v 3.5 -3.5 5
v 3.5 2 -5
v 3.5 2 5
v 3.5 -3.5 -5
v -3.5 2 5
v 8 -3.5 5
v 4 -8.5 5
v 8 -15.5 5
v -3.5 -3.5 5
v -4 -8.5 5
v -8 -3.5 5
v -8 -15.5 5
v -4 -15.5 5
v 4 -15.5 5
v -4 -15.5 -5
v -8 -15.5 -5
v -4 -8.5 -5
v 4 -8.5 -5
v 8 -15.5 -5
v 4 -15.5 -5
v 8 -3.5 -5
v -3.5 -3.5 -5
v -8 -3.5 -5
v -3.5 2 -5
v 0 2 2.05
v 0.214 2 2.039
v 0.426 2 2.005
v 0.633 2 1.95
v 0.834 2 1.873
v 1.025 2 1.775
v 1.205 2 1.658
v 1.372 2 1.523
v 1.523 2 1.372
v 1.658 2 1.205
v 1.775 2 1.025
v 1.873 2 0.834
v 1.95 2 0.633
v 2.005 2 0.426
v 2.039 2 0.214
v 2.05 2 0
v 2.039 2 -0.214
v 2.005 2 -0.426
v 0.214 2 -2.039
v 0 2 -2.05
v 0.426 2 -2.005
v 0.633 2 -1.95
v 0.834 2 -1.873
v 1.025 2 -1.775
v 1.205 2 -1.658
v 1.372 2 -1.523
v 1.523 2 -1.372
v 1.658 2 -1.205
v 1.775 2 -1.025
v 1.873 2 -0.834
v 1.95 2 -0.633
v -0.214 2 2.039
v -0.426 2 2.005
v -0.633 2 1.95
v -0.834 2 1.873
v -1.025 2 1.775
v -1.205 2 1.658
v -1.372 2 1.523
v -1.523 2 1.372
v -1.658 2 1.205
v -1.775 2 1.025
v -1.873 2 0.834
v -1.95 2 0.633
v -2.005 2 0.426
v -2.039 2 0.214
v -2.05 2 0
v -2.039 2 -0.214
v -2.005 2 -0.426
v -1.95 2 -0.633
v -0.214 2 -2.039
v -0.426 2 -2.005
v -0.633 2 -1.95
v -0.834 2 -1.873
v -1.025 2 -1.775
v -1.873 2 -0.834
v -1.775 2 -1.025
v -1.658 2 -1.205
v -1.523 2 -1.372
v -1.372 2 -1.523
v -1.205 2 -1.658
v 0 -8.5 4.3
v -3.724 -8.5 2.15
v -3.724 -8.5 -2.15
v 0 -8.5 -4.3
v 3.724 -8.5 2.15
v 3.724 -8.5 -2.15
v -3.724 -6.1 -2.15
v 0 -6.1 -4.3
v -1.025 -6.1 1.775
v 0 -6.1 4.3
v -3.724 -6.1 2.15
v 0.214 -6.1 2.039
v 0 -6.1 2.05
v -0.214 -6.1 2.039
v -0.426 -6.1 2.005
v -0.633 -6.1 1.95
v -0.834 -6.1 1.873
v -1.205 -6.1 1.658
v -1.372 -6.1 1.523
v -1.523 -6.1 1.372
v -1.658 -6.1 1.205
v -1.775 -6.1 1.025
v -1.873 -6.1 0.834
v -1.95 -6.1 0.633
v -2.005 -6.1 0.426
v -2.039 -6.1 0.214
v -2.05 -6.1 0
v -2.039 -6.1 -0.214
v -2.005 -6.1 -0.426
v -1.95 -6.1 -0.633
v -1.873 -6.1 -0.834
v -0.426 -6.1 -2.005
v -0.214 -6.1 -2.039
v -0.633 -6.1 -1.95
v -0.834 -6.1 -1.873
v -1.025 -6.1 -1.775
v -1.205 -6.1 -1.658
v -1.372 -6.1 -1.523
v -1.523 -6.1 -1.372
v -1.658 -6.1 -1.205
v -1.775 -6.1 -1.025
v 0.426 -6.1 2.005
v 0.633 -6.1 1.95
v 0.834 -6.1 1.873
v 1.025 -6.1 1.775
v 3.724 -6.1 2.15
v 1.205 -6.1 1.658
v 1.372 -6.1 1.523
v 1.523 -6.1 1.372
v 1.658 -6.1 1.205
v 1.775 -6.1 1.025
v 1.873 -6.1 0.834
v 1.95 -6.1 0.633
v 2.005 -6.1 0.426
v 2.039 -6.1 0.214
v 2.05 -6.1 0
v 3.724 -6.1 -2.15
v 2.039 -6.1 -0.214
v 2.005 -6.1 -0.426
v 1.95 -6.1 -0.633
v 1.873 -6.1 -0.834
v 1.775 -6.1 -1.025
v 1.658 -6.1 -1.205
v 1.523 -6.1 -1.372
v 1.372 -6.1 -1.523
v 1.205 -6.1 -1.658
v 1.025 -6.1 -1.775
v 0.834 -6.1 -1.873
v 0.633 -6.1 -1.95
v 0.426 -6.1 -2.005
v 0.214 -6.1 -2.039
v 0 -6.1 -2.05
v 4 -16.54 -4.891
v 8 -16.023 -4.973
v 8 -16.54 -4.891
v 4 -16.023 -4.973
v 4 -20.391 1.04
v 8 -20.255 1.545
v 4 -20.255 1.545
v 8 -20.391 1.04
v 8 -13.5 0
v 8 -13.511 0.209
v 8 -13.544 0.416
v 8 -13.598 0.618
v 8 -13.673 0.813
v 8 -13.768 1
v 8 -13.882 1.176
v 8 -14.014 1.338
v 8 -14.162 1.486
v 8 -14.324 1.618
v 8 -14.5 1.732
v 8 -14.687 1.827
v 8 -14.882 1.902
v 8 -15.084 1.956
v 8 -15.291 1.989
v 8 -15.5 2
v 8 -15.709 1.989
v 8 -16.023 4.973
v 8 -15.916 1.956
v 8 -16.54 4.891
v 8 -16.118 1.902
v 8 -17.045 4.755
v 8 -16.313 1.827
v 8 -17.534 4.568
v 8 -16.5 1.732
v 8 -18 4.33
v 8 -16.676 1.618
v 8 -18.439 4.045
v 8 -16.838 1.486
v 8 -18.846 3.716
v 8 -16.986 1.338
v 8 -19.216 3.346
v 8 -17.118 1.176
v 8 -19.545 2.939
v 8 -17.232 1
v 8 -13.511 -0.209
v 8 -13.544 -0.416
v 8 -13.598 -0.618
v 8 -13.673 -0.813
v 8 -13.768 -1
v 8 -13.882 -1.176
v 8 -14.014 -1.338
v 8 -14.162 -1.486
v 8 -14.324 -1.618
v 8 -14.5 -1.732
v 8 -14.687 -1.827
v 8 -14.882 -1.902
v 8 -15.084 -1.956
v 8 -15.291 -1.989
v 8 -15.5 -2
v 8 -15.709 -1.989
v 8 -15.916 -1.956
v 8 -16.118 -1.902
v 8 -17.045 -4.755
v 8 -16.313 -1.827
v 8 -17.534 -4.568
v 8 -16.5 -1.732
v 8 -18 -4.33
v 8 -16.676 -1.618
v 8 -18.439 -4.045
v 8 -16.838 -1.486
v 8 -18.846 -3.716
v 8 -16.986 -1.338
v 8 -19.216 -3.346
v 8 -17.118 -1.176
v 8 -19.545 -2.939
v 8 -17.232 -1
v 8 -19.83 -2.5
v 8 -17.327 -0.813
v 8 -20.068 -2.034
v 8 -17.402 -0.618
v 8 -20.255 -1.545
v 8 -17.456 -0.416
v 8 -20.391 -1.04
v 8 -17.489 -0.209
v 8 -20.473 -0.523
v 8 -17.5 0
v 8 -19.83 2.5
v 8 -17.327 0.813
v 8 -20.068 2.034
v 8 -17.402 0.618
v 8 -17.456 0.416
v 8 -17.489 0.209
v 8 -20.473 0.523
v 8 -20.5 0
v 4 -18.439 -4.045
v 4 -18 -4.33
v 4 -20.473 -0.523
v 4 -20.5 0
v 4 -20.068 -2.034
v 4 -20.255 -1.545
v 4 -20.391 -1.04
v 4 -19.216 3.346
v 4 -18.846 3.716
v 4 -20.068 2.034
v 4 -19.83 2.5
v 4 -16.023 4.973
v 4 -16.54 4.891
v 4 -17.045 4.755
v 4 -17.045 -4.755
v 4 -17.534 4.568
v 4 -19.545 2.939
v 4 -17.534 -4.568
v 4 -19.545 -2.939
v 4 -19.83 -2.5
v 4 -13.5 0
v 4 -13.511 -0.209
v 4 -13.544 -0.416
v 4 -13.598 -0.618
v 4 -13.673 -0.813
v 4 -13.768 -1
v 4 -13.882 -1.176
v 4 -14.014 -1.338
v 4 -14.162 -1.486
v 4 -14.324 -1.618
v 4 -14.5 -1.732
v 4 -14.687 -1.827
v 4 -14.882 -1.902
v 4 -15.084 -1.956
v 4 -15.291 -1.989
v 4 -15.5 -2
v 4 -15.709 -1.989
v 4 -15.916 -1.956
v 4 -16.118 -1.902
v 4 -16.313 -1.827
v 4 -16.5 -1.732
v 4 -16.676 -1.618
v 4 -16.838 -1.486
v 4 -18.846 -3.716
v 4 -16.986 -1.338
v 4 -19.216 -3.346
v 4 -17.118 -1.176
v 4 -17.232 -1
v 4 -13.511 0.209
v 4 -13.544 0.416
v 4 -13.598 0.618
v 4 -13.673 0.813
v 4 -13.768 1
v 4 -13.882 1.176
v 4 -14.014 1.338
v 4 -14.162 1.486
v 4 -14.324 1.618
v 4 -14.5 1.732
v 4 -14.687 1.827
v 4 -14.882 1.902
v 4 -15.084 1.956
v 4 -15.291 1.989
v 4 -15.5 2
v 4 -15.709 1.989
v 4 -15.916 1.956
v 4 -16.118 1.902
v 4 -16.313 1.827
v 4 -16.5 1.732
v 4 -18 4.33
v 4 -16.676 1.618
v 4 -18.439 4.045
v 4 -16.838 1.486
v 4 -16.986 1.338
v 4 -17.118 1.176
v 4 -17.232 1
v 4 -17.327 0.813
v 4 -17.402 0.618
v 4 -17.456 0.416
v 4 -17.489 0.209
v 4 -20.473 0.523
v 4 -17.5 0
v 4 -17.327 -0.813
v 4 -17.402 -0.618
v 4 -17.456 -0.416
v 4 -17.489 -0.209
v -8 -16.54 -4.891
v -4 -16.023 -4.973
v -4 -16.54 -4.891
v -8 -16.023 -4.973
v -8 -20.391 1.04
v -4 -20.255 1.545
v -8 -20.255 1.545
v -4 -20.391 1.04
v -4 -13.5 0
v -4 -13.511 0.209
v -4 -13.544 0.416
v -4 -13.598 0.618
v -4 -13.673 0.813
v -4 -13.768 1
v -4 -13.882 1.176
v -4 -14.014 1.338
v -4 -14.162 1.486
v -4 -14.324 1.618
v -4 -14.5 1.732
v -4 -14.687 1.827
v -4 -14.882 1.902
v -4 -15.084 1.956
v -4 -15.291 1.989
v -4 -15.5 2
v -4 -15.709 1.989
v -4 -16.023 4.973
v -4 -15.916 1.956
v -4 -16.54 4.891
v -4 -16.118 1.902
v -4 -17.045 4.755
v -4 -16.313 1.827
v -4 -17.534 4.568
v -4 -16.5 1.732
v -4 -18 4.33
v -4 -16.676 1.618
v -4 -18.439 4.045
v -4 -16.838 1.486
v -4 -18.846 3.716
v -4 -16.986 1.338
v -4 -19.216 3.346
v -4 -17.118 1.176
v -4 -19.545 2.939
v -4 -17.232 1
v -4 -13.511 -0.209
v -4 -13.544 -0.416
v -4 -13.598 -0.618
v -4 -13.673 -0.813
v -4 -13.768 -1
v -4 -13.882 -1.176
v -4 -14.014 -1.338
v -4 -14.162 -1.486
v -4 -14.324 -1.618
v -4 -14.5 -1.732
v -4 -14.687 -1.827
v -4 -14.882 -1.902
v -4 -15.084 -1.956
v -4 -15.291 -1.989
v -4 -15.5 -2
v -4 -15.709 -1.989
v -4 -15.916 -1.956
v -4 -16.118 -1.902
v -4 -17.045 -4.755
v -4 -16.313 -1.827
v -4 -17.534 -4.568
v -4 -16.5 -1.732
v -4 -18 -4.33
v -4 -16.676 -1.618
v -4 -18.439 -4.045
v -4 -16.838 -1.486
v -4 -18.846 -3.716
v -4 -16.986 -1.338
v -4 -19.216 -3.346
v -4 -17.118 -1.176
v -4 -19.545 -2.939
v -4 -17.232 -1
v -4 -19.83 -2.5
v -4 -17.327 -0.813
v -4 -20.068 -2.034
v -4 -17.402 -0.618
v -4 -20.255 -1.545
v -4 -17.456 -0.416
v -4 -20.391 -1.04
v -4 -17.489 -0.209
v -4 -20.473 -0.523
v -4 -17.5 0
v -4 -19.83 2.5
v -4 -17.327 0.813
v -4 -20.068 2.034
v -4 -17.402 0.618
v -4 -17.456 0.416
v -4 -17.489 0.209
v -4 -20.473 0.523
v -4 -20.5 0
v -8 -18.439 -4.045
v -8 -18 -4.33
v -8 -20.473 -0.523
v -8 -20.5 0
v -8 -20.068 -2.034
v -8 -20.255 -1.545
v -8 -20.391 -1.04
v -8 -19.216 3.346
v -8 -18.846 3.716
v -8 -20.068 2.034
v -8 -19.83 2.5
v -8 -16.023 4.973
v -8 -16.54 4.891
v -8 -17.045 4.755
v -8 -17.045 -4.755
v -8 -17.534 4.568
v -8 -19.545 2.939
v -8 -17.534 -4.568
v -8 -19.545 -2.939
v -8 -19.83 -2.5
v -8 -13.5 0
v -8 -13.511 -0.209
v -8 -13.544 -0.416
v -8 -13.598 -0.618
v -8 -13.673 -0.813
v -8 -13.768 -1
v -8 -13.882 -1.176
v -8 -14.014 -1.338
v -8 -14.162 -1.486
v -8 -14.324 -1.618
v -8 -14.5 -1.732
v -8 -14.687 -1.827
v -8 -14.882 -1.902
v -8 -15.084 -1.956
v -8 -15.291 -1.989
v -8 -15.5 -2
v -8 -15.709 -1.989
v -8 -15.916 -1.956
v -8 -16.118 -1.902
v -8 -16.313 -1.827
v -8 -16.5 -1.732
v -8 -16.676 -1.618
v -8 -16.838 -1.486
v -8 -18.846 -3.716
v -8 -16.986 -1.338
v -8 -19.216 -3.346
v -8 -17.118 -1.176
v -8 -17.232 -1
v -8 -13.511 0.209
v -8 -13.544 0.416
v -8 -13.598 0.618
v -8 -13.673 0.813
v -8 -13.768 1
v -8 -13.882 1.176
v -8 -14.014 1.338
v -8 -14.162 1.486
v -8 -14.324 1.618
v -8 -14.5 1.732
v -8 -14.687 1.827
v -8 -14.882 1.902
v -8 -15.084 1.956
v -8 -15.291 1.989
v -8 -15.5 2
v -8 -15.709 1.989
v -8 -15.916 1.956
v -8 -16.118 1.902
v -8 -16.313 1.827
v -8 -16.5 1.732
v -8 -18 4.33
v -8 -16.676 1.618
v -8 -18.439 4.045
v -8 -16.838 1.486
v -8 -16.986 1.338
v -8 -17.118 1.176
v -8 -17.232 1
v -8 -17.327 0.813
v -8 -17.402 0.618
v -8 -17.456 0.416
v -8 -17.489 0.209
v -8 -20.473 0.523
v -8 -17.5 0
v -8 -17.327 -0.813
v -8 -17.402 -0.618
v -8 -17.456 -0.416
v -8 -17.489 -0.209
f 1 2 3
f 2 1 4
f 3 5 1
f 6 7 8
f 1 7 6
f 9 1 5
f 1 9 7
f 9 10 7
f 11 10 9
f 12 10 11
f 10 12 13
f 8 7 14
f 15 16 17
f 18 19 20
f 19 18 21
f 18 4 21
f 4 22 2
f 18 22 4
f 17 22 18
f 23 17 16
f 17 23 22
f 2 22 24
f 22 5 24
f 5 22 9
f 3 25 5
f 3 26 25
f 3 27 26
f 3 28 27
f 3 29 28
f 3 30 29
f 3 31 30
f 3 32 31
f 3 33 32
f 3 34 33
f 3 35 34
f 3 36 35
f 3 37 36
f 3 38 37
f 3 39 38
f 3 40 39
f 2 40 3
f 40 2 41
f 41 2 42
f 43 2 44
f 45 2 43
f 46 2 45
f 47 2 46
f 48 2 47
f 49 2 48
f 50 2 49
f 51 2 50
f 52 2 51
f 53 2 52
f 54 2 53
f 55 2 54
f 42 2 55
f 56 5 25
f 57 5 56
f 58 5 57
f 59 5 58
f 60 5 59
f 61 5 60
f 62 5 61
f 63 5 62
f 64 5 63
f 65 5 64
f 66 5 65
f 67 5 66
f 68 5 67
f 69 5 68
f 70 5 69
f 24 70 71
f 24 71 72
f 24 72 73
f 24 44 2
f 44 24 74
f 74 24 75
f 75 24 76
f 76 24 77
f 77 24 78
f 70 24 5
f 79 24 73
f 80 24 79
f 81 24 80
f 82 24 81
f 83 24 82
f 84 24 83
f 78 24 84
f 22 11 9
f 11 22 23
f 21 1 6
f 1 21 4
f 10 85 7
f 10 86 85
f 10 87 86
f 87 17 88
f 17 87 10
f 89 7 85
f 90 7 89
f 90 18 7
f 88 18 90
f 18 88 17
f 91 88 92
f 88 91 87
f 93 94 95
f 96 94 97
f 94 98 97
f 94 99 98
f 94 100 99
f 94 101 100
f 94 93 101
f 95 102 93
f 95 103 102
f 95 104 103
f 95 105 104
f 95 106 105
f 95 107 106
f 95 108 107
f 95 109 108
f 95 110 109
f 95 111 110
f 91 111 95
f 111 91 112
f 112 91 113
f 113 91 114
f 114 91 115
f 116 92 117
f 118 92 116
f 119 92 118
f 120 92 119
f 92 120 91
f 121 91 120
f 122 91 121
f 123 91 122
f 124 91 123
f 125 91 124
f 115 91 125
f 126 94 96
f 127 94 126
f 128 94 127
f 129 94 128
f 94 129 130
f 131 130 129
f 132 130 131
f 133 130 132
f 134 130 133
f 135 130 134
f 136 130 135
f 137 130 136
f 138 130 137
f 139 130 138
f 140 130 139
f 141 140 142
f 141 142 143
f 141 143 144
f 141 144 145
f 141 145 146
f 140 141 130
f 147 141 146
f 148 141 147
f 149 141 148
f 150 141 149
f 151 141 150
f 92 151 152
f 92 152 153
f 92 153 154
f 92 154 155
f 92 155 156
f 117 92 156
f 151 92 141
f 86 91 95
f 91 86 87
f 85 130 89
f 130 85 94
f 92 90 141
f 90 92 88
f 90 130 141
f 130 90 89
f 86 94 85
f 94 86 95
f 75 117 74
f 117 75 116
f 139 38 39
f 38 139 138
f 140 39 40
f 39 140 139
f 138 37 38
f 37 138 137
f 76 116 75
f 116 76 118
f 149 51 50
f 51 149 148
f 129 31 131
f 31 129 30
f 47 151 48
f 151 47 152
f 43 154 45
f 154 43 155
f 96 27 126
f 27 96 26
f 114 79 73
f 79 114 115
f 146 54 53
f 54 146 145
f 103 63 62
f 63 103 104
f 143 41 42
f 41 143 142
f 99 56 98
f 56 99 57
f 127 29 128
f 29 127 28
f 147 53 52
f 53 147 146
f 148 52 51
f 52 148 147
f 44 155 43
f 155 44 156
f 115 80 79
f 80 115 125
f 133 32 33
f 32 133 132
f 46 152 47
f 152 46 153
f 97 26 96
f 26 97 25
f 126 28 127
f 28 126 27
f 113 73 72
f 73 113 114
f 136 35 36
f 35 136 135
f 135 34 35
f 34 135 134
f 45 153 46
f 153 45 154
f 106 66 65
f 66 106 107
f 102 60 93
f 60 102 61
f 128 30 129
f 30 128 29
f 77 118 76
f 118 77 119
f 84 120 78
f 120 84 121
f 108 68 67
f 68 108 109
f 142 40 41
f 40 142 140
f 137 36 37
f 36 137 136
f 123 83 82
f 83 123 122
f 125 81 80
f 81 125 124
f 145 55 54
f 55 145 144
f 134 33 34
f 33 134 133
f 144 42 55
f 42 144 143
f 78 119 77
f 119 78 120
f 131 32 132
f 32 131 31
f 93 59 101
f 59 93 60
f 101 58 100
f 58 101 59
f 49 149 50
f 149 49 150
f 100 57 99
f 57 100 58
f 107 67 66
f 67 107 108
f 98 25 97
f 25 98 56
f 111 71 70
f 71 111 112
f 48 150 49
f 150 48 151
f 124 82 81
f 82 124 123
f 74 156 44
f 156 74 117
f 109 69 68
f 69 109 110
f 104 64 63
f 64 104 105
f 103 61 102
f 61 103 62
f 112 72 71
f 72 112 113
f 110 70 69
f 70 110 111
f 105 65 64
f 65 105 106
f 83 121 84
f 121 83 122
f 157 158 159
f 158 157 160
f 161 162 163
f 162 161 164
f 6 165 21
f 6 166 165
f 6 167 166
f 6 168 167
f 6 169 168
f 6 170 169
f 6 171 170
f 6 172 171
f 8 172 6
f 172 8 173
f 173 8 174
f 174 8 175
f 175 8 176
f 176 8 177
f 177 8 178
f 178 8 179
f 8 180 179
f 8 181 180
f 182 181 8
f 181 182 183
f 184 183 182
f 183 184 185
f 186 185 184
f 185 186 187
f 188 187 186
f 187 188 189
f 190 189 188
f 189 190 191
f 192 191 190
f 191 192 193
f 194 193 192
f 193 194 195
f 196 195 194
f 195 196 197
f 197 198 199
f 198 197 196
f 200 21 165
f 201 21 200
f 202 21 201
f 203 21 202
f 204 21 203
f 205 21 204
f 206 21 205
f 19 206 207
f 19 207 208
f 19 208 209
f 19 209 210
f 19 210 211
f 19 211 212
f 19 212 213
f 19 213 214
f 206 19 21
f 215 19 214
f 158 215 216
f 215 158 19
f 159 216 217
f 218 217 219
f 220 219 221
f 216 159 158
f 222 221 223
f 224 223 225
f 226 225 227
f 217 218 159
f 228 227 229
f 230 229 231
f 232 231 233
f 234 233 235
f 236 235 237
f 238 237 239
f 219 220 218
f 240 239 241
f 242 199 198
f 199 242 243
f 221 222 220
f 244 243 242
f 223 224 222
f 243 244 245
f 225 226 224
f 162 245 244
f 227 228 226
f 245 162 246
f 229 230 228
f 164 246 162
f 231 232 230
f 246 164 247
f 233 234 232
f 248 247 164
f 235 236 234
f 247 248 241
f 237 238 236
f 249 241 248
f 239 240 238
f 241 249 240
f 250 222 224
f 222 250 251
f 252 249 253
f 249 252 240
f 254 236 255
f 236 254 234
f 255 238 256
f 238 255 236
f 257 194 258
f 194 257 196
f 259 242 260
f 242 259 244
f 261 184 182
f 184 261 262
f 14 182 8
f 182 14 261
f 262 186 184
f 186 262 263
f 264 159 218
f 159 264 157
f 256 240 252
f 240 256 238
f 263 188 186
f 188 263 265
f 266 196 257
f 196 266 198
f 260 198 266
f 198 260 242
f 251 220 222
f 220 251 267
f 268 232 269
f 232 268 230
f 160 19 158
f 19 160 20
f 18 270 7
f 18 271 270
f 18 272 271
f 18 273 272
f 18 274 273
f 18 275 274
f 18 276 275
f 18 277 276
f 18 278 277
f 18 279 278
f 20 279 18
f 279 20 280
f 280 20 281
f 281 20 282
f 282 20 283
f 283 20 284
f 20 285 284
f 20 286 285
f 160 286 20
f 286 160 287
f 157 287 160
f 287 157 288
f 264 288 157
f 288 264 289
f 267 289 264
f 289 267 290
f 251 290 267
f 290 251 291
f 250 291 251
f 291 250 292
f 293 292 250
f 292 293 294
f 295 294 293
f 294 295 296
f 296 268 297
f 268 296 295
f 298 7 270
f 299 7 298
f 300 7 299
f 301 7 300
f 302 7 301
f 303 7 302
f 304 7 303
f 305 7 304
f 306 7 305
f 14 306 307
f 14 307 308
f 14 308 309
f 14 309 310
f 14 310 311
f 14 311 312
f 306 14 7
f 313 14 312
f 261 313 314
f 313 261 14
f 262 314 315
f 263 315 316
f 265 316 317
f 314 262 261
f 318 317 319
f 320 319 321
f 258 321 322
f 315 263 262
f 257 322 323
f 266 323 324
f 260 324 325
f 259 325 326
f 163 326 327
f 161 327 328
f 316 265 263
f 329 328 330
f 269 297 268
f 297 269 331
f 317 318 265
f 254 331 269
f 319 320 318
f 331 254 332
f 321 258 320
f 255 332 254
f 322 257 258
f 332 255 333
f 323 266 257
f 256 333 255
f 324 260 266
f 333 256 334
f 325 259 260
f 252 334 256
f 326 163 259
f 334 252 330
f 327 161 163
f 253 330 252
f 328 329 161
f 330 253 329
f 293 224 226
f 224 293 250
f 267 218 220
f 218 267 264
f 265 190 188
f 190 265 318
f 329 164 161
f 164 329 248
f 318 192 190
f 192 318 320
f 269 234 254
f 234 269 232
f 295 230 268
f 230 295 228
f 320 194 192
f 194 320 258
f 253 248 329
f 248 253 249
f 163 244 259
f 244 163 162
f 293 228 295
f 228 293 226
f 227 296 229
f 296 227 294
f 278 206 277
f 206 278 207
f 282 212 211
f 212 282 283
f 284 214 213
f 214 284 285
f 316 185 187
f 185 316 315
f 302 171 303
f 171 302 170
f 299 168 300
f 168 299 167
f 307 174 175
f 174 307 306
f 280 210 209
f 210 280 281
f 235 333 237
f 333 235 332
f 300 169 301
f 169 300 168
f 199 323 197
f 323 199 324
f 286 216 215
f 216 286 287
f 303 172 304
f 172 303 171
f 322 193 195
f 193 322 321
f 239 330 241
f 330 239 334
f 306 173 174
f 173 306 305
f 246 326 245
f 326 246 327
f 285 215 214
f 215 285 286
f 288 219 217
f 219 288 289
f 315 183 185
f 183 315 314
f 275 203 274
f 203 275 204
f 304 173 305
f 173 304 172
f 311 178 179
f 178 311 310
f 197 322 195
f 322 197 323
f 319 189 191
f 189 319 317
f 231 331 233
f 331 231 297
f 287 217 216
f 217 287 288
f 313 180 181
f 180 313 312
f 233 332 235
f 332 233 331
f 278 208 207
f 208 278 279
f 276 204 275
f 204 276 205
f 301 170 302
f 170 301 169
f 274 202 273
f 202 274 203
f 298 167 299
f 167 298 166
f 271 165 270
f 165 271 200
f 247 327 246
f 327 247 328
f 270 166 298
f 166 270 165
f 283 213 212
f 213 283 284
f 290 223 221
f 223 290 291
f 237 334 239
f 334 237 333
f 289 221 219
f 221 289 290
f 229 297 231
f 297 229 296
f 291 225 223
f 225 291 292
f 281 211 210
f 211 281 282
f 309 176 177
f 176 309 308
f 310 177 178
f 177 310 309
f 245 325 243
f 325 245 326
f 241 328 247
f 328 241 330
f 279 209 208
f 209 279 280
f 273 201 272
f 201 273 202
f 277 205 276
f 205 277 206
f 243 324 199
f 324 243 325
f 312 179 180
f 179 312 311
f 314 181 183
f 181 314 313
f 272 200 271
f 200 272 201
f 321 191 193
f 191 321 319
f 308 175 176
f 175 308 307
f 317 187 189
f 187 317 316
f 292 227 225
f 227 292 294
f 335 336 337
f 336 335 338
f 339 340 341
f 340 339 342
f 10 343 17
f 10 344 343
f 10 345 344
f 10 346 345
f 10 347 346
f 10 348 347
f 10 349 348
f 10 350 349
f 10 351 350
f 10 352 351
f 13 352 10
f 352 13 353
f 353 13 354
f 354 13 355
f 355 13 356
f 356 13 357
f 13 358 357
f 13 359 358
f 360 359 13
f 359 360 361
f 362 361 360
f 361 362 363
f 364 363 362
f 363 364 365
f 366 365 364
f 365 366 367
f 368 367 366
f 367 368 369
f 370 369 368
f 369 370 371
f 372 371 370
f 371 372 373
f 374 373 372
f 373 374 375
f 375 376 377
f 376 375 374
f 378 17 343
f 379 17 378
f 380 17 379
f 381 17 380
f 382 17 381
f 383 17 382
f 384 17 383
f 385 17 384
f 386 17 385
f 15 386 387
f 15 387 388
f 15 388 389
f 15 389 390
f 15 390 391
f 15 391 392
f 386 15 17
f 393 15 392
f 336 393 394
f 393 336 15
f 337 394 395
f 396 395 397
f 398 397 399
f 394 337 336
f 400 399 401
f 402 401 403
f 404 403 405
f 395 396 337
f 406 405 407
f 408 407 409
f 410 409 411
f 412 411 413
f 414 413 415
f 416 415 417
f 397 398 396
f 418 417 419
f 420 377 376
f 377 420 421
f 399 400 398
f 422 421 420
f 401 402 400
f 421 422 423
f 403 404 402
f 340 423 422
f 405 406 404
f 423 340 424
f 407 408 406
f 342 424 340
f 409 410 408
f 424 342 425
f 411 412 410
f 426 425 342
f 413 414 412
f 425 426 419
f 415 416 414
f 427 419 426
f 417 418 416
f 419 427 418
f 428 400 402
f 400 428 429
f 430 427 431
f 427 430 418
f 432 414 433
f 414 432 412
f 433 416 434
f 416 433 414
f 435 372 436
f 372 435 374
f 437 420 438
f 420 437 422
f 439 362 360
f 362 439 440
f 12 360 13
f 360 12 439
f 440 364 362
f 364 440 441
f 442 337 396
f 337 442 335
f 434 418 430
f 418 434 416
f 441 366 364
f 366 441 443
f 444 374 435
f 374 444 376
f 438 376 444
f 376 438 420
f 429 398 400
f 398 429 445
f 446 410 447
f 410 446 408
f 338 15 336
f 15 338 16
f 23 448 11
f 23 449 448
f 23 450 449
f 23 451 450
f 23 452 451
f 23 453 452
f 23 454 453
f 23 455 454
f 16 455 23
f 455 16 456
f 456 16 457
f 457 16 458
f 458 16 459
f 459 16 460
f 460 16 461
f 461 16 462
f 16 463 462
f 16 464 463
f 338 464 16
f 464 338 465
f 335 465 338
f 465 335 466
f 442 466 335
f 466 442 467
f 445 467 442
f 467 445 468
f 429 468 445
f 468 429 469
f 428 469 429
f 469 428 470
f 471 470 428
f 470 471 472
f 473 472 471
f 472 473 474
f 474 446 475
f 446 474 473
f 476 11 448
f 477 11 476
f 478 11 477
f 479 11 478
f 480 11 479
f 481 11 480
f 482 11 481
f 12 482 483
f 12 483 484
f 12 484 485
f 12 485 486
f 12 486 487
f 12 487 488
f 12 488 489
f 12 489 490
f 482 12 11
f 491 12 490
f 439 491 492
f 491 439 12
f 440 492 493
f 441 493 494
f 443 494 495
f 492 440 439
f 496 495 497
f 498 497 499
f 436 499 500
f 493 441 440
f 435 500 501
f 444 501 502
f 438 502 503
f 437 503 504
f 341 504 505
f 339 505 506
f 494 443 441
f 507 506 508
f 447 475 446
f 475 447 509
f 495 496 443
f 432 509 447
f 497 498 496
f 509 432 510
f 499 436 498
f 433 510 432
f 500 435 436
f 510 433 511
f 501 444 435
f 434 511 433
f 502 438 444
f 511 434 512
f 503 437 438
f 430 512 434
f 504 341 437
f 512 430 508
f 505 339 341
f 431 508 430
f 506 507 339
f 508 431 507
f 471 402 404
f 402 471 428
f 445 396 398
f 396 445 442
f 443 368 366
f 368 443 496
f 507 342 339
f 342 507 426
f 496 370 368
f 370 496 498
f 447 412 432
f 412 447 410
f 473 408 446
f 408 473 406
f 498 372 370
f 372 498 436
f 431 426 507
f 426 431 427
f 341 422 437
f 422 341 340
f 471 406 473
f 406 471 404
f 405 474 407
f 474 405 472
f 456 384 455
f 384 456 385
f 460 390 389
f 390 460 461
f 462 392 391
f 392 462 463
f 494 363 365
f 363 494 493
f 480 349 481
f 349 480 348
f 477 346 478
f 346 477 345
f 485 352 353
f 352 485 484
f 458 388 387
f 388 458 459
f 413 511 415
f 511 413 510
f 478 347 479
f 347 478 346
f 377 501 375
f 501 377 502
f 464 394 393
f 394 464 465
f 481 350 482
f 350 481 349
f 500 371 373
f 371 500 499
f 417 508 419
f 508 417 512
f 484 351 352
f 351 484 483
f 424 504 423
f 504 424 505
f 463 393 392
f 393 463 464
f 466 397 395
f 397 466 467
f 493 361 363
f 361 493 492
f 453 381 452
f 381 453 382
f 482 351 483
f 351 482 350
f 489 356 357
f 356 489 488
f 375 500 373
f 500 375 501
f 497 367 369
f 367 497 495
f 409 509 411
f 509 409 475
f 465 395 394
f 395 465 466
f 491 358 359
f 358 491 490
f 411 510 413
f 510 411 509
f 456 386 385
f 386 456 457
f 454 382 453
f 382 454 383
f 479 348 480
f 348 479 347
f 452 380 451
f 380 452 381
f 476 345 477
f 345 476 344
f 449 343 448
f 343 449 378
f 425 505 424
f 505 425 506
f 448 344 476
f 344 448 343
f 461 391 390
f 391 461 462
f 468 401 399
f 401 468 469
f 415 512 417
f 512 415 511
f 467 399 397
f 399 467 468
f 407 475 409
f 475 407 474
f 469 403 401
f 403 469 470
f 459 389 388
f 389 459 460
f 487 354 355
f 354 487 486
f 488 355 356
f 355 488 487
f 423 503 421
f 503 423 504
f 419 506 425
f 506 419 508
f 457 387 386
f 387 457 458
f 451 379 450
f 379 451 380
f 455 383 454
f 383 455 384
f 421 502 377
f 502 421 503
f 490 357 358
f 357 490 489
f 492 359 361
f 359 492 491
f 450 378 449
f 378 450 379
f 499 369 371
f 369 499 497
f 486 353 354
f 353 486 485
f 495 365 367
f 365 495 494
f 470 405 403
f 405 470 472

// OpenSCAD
// file: Fan_60x25.scad
$fn=60;  //Working
//$fn=720;  //Show off
//=======================================================================================  
module fan_60mm_x_25mm()
  {
  difference()
    {
    linear_extrude(height=25, center = true, convexity = 4, twist = 0)
      difference()
        {
        //overall outside
        square([60,60],center=true);
        //main inside bore, less hub
        difference()
          {
          circle(r=57/2,center=true);
          //hub. Just imagine the blades, OK?
          circle(r=31.5/2,center=true);
          }
        //Mounting holes
        translate([+25,+25]) circle(r=3.4/2,h=25+0.2,center=true);
        translate([+25,-25]) circle(r=3.4/2,h=25+0.2,center=true);
        translate([-25,+25]) circle(r=3.4/2,h=25+0.2,center=true);
        translate([-25,-25]) circle(r=3.4/2,h=25+0.2,center=true);
        //Outside Radii
        translate([+30,+30]) difference()
          {
          translate([-4.9,-4.9]) square([5.1,5.1]);
          translate([-5,-5]) circle(r=5);
          }
        translate([+30,-30]) difference()
          {
          translate([-4.9,-0.1]) square([5.1,5.1]);
          translate([-5,+5]) circle(r=5);
          }
        translate([-30,+30]) difference()
          {
          translate([-0.1,-4.9]) square([5.1,5.1]);
          translate([+5,-5]) circle(r=5);
          }
        translate([-30,-30]) difference()
          {
          translate([-0.1,-0.1]) square([5+0.1,5+0.1]);
          translate([5,5]) circle(r=5);
          }
      } //linear extrude and 2-d difference
    //Remove outside ring
    difference()
      {
      cylinder(r=88/2,h=25-3.6-3.6,center=true);
      cylinder(r=64/2,h=25-3.6-3.6+0.2,center=true);
      }      
    }// 3-d difference

    //Seven Blades
    linear_extrude(height=24, center = true, convexity = 4, twist = -30)
      for(i=[0:6])
        rotate((360*i)/7)
          translate([0,-1.5/2]) #square([57/2-0.75,1.5]);
  }
//=======================================================================================  
fan_60mm_x_25mm();
//=======================================================================================  
// main file
use <main.scad>

$fn = 60;

/*
 *  AUTOMATICALLY GENERATED VARIABLE
 *  DO NOT TOUCH THIS !
 */
ARM_THICKNESS = 7;

arm_thickness = ARM_THICKNESS;
arm_length = 95;
offset = 1;
offset_arm = 6;

HANDLER_HEIGHT = 3;

/*
module attach() {

    height = HANDLER_HEIGHT;

    // Arm
    difference() {
        union() {
            translate([0, 0, 0]) {
                arm(3, arm_thickness, false);
            }

            translate([0, -3, 0]) {
                arm(height, arm_thickness, true);
            }

/*
            translate([0, -height - 8, 0]) {
                cube(size = [10, 10, 10], center = true);
            }
        }

        translate([0, -height - 8 - 3.6, 0]) {
            rotate([90, 0, 0]) {
                m4_nut();
            }
        }
*-/

        }

        translate([0, 75, 0]) {
            rotate([90, 0, 0]) {
                cylinder(r = 2.05, h = 150);
            }
        }
    }

    thickness = 4;
    difference() {
        translate([0, -16, 0]) {
            cube(size = [thickness, 20, 10], center = true);
        }

        translate([0, -16, 0]) {
            rotate([0, 90, 0]) {
               cylinder(r = 1.5, h = 10, center = true);
            }
        }
    }
}
*/

module attach() {

    height = HANDLER_HEIGHT;

    // Arm
    difference() {
        union() {
            translate([0, -height, 0]) {
                cube(size = [7, 10, 10], center = true);
            }

            translate([0, -height - 3, 0]) {
                cube(size = [10, 5, 10], center = true);
            }
        }

        translate([0, -height - 4.6, 0]) {
            rotate([90, 90, 0]) {
                m4_nut();
            }
        }

        translate([0, 75, 0]) {
            rotate([90, 0, 0]) {
                cylinder(r = 2.05, h = 150);
            }
        }
    }

/*
    %translate([0, 0, 0]) {
        cube(size = [7, 100, 10], center = true);
    }
*/
    arm_spacing = 8;

    module arm() {
        diameter = 4;
        length = 12;
        difference() {
            union() {
                translate([-2, -length / 2, 0]) {
                    rotate([0, 90, 0]) {
                        cylinder(r = 5, h = 4);
                    }
                }

                cube(size = [4, length, 10], center = true);
            }

            translate([-2, -length / 2, 0]) {
                rotate([0, 90, 0]) {
                    cylinder(r = 2, h = 50, center = true);
                }
            }
        }
    }

    for (pos = [
        [arm_spacing / 2 + 2, -9.5, 0],
        [-arm_spacing / 2 - 2, -9.5, 0]
    ]) {
        translate(pos) {
            arm();
        }
    }
}

module demo() {
    rotate([-90, 0, 0]) {
        support();
        handle();

        translate([0, -arm_length - 9, 0]) {
            verticalBase();
            attach();
        }
    }
}

if (1) {
    attach();
    %verticalBase();
    //handle();
/*
    %difference() {
        pivot(true);
        pivot(true, true);
    }
    pivot(false);
*/
} else {
    demo();
}
